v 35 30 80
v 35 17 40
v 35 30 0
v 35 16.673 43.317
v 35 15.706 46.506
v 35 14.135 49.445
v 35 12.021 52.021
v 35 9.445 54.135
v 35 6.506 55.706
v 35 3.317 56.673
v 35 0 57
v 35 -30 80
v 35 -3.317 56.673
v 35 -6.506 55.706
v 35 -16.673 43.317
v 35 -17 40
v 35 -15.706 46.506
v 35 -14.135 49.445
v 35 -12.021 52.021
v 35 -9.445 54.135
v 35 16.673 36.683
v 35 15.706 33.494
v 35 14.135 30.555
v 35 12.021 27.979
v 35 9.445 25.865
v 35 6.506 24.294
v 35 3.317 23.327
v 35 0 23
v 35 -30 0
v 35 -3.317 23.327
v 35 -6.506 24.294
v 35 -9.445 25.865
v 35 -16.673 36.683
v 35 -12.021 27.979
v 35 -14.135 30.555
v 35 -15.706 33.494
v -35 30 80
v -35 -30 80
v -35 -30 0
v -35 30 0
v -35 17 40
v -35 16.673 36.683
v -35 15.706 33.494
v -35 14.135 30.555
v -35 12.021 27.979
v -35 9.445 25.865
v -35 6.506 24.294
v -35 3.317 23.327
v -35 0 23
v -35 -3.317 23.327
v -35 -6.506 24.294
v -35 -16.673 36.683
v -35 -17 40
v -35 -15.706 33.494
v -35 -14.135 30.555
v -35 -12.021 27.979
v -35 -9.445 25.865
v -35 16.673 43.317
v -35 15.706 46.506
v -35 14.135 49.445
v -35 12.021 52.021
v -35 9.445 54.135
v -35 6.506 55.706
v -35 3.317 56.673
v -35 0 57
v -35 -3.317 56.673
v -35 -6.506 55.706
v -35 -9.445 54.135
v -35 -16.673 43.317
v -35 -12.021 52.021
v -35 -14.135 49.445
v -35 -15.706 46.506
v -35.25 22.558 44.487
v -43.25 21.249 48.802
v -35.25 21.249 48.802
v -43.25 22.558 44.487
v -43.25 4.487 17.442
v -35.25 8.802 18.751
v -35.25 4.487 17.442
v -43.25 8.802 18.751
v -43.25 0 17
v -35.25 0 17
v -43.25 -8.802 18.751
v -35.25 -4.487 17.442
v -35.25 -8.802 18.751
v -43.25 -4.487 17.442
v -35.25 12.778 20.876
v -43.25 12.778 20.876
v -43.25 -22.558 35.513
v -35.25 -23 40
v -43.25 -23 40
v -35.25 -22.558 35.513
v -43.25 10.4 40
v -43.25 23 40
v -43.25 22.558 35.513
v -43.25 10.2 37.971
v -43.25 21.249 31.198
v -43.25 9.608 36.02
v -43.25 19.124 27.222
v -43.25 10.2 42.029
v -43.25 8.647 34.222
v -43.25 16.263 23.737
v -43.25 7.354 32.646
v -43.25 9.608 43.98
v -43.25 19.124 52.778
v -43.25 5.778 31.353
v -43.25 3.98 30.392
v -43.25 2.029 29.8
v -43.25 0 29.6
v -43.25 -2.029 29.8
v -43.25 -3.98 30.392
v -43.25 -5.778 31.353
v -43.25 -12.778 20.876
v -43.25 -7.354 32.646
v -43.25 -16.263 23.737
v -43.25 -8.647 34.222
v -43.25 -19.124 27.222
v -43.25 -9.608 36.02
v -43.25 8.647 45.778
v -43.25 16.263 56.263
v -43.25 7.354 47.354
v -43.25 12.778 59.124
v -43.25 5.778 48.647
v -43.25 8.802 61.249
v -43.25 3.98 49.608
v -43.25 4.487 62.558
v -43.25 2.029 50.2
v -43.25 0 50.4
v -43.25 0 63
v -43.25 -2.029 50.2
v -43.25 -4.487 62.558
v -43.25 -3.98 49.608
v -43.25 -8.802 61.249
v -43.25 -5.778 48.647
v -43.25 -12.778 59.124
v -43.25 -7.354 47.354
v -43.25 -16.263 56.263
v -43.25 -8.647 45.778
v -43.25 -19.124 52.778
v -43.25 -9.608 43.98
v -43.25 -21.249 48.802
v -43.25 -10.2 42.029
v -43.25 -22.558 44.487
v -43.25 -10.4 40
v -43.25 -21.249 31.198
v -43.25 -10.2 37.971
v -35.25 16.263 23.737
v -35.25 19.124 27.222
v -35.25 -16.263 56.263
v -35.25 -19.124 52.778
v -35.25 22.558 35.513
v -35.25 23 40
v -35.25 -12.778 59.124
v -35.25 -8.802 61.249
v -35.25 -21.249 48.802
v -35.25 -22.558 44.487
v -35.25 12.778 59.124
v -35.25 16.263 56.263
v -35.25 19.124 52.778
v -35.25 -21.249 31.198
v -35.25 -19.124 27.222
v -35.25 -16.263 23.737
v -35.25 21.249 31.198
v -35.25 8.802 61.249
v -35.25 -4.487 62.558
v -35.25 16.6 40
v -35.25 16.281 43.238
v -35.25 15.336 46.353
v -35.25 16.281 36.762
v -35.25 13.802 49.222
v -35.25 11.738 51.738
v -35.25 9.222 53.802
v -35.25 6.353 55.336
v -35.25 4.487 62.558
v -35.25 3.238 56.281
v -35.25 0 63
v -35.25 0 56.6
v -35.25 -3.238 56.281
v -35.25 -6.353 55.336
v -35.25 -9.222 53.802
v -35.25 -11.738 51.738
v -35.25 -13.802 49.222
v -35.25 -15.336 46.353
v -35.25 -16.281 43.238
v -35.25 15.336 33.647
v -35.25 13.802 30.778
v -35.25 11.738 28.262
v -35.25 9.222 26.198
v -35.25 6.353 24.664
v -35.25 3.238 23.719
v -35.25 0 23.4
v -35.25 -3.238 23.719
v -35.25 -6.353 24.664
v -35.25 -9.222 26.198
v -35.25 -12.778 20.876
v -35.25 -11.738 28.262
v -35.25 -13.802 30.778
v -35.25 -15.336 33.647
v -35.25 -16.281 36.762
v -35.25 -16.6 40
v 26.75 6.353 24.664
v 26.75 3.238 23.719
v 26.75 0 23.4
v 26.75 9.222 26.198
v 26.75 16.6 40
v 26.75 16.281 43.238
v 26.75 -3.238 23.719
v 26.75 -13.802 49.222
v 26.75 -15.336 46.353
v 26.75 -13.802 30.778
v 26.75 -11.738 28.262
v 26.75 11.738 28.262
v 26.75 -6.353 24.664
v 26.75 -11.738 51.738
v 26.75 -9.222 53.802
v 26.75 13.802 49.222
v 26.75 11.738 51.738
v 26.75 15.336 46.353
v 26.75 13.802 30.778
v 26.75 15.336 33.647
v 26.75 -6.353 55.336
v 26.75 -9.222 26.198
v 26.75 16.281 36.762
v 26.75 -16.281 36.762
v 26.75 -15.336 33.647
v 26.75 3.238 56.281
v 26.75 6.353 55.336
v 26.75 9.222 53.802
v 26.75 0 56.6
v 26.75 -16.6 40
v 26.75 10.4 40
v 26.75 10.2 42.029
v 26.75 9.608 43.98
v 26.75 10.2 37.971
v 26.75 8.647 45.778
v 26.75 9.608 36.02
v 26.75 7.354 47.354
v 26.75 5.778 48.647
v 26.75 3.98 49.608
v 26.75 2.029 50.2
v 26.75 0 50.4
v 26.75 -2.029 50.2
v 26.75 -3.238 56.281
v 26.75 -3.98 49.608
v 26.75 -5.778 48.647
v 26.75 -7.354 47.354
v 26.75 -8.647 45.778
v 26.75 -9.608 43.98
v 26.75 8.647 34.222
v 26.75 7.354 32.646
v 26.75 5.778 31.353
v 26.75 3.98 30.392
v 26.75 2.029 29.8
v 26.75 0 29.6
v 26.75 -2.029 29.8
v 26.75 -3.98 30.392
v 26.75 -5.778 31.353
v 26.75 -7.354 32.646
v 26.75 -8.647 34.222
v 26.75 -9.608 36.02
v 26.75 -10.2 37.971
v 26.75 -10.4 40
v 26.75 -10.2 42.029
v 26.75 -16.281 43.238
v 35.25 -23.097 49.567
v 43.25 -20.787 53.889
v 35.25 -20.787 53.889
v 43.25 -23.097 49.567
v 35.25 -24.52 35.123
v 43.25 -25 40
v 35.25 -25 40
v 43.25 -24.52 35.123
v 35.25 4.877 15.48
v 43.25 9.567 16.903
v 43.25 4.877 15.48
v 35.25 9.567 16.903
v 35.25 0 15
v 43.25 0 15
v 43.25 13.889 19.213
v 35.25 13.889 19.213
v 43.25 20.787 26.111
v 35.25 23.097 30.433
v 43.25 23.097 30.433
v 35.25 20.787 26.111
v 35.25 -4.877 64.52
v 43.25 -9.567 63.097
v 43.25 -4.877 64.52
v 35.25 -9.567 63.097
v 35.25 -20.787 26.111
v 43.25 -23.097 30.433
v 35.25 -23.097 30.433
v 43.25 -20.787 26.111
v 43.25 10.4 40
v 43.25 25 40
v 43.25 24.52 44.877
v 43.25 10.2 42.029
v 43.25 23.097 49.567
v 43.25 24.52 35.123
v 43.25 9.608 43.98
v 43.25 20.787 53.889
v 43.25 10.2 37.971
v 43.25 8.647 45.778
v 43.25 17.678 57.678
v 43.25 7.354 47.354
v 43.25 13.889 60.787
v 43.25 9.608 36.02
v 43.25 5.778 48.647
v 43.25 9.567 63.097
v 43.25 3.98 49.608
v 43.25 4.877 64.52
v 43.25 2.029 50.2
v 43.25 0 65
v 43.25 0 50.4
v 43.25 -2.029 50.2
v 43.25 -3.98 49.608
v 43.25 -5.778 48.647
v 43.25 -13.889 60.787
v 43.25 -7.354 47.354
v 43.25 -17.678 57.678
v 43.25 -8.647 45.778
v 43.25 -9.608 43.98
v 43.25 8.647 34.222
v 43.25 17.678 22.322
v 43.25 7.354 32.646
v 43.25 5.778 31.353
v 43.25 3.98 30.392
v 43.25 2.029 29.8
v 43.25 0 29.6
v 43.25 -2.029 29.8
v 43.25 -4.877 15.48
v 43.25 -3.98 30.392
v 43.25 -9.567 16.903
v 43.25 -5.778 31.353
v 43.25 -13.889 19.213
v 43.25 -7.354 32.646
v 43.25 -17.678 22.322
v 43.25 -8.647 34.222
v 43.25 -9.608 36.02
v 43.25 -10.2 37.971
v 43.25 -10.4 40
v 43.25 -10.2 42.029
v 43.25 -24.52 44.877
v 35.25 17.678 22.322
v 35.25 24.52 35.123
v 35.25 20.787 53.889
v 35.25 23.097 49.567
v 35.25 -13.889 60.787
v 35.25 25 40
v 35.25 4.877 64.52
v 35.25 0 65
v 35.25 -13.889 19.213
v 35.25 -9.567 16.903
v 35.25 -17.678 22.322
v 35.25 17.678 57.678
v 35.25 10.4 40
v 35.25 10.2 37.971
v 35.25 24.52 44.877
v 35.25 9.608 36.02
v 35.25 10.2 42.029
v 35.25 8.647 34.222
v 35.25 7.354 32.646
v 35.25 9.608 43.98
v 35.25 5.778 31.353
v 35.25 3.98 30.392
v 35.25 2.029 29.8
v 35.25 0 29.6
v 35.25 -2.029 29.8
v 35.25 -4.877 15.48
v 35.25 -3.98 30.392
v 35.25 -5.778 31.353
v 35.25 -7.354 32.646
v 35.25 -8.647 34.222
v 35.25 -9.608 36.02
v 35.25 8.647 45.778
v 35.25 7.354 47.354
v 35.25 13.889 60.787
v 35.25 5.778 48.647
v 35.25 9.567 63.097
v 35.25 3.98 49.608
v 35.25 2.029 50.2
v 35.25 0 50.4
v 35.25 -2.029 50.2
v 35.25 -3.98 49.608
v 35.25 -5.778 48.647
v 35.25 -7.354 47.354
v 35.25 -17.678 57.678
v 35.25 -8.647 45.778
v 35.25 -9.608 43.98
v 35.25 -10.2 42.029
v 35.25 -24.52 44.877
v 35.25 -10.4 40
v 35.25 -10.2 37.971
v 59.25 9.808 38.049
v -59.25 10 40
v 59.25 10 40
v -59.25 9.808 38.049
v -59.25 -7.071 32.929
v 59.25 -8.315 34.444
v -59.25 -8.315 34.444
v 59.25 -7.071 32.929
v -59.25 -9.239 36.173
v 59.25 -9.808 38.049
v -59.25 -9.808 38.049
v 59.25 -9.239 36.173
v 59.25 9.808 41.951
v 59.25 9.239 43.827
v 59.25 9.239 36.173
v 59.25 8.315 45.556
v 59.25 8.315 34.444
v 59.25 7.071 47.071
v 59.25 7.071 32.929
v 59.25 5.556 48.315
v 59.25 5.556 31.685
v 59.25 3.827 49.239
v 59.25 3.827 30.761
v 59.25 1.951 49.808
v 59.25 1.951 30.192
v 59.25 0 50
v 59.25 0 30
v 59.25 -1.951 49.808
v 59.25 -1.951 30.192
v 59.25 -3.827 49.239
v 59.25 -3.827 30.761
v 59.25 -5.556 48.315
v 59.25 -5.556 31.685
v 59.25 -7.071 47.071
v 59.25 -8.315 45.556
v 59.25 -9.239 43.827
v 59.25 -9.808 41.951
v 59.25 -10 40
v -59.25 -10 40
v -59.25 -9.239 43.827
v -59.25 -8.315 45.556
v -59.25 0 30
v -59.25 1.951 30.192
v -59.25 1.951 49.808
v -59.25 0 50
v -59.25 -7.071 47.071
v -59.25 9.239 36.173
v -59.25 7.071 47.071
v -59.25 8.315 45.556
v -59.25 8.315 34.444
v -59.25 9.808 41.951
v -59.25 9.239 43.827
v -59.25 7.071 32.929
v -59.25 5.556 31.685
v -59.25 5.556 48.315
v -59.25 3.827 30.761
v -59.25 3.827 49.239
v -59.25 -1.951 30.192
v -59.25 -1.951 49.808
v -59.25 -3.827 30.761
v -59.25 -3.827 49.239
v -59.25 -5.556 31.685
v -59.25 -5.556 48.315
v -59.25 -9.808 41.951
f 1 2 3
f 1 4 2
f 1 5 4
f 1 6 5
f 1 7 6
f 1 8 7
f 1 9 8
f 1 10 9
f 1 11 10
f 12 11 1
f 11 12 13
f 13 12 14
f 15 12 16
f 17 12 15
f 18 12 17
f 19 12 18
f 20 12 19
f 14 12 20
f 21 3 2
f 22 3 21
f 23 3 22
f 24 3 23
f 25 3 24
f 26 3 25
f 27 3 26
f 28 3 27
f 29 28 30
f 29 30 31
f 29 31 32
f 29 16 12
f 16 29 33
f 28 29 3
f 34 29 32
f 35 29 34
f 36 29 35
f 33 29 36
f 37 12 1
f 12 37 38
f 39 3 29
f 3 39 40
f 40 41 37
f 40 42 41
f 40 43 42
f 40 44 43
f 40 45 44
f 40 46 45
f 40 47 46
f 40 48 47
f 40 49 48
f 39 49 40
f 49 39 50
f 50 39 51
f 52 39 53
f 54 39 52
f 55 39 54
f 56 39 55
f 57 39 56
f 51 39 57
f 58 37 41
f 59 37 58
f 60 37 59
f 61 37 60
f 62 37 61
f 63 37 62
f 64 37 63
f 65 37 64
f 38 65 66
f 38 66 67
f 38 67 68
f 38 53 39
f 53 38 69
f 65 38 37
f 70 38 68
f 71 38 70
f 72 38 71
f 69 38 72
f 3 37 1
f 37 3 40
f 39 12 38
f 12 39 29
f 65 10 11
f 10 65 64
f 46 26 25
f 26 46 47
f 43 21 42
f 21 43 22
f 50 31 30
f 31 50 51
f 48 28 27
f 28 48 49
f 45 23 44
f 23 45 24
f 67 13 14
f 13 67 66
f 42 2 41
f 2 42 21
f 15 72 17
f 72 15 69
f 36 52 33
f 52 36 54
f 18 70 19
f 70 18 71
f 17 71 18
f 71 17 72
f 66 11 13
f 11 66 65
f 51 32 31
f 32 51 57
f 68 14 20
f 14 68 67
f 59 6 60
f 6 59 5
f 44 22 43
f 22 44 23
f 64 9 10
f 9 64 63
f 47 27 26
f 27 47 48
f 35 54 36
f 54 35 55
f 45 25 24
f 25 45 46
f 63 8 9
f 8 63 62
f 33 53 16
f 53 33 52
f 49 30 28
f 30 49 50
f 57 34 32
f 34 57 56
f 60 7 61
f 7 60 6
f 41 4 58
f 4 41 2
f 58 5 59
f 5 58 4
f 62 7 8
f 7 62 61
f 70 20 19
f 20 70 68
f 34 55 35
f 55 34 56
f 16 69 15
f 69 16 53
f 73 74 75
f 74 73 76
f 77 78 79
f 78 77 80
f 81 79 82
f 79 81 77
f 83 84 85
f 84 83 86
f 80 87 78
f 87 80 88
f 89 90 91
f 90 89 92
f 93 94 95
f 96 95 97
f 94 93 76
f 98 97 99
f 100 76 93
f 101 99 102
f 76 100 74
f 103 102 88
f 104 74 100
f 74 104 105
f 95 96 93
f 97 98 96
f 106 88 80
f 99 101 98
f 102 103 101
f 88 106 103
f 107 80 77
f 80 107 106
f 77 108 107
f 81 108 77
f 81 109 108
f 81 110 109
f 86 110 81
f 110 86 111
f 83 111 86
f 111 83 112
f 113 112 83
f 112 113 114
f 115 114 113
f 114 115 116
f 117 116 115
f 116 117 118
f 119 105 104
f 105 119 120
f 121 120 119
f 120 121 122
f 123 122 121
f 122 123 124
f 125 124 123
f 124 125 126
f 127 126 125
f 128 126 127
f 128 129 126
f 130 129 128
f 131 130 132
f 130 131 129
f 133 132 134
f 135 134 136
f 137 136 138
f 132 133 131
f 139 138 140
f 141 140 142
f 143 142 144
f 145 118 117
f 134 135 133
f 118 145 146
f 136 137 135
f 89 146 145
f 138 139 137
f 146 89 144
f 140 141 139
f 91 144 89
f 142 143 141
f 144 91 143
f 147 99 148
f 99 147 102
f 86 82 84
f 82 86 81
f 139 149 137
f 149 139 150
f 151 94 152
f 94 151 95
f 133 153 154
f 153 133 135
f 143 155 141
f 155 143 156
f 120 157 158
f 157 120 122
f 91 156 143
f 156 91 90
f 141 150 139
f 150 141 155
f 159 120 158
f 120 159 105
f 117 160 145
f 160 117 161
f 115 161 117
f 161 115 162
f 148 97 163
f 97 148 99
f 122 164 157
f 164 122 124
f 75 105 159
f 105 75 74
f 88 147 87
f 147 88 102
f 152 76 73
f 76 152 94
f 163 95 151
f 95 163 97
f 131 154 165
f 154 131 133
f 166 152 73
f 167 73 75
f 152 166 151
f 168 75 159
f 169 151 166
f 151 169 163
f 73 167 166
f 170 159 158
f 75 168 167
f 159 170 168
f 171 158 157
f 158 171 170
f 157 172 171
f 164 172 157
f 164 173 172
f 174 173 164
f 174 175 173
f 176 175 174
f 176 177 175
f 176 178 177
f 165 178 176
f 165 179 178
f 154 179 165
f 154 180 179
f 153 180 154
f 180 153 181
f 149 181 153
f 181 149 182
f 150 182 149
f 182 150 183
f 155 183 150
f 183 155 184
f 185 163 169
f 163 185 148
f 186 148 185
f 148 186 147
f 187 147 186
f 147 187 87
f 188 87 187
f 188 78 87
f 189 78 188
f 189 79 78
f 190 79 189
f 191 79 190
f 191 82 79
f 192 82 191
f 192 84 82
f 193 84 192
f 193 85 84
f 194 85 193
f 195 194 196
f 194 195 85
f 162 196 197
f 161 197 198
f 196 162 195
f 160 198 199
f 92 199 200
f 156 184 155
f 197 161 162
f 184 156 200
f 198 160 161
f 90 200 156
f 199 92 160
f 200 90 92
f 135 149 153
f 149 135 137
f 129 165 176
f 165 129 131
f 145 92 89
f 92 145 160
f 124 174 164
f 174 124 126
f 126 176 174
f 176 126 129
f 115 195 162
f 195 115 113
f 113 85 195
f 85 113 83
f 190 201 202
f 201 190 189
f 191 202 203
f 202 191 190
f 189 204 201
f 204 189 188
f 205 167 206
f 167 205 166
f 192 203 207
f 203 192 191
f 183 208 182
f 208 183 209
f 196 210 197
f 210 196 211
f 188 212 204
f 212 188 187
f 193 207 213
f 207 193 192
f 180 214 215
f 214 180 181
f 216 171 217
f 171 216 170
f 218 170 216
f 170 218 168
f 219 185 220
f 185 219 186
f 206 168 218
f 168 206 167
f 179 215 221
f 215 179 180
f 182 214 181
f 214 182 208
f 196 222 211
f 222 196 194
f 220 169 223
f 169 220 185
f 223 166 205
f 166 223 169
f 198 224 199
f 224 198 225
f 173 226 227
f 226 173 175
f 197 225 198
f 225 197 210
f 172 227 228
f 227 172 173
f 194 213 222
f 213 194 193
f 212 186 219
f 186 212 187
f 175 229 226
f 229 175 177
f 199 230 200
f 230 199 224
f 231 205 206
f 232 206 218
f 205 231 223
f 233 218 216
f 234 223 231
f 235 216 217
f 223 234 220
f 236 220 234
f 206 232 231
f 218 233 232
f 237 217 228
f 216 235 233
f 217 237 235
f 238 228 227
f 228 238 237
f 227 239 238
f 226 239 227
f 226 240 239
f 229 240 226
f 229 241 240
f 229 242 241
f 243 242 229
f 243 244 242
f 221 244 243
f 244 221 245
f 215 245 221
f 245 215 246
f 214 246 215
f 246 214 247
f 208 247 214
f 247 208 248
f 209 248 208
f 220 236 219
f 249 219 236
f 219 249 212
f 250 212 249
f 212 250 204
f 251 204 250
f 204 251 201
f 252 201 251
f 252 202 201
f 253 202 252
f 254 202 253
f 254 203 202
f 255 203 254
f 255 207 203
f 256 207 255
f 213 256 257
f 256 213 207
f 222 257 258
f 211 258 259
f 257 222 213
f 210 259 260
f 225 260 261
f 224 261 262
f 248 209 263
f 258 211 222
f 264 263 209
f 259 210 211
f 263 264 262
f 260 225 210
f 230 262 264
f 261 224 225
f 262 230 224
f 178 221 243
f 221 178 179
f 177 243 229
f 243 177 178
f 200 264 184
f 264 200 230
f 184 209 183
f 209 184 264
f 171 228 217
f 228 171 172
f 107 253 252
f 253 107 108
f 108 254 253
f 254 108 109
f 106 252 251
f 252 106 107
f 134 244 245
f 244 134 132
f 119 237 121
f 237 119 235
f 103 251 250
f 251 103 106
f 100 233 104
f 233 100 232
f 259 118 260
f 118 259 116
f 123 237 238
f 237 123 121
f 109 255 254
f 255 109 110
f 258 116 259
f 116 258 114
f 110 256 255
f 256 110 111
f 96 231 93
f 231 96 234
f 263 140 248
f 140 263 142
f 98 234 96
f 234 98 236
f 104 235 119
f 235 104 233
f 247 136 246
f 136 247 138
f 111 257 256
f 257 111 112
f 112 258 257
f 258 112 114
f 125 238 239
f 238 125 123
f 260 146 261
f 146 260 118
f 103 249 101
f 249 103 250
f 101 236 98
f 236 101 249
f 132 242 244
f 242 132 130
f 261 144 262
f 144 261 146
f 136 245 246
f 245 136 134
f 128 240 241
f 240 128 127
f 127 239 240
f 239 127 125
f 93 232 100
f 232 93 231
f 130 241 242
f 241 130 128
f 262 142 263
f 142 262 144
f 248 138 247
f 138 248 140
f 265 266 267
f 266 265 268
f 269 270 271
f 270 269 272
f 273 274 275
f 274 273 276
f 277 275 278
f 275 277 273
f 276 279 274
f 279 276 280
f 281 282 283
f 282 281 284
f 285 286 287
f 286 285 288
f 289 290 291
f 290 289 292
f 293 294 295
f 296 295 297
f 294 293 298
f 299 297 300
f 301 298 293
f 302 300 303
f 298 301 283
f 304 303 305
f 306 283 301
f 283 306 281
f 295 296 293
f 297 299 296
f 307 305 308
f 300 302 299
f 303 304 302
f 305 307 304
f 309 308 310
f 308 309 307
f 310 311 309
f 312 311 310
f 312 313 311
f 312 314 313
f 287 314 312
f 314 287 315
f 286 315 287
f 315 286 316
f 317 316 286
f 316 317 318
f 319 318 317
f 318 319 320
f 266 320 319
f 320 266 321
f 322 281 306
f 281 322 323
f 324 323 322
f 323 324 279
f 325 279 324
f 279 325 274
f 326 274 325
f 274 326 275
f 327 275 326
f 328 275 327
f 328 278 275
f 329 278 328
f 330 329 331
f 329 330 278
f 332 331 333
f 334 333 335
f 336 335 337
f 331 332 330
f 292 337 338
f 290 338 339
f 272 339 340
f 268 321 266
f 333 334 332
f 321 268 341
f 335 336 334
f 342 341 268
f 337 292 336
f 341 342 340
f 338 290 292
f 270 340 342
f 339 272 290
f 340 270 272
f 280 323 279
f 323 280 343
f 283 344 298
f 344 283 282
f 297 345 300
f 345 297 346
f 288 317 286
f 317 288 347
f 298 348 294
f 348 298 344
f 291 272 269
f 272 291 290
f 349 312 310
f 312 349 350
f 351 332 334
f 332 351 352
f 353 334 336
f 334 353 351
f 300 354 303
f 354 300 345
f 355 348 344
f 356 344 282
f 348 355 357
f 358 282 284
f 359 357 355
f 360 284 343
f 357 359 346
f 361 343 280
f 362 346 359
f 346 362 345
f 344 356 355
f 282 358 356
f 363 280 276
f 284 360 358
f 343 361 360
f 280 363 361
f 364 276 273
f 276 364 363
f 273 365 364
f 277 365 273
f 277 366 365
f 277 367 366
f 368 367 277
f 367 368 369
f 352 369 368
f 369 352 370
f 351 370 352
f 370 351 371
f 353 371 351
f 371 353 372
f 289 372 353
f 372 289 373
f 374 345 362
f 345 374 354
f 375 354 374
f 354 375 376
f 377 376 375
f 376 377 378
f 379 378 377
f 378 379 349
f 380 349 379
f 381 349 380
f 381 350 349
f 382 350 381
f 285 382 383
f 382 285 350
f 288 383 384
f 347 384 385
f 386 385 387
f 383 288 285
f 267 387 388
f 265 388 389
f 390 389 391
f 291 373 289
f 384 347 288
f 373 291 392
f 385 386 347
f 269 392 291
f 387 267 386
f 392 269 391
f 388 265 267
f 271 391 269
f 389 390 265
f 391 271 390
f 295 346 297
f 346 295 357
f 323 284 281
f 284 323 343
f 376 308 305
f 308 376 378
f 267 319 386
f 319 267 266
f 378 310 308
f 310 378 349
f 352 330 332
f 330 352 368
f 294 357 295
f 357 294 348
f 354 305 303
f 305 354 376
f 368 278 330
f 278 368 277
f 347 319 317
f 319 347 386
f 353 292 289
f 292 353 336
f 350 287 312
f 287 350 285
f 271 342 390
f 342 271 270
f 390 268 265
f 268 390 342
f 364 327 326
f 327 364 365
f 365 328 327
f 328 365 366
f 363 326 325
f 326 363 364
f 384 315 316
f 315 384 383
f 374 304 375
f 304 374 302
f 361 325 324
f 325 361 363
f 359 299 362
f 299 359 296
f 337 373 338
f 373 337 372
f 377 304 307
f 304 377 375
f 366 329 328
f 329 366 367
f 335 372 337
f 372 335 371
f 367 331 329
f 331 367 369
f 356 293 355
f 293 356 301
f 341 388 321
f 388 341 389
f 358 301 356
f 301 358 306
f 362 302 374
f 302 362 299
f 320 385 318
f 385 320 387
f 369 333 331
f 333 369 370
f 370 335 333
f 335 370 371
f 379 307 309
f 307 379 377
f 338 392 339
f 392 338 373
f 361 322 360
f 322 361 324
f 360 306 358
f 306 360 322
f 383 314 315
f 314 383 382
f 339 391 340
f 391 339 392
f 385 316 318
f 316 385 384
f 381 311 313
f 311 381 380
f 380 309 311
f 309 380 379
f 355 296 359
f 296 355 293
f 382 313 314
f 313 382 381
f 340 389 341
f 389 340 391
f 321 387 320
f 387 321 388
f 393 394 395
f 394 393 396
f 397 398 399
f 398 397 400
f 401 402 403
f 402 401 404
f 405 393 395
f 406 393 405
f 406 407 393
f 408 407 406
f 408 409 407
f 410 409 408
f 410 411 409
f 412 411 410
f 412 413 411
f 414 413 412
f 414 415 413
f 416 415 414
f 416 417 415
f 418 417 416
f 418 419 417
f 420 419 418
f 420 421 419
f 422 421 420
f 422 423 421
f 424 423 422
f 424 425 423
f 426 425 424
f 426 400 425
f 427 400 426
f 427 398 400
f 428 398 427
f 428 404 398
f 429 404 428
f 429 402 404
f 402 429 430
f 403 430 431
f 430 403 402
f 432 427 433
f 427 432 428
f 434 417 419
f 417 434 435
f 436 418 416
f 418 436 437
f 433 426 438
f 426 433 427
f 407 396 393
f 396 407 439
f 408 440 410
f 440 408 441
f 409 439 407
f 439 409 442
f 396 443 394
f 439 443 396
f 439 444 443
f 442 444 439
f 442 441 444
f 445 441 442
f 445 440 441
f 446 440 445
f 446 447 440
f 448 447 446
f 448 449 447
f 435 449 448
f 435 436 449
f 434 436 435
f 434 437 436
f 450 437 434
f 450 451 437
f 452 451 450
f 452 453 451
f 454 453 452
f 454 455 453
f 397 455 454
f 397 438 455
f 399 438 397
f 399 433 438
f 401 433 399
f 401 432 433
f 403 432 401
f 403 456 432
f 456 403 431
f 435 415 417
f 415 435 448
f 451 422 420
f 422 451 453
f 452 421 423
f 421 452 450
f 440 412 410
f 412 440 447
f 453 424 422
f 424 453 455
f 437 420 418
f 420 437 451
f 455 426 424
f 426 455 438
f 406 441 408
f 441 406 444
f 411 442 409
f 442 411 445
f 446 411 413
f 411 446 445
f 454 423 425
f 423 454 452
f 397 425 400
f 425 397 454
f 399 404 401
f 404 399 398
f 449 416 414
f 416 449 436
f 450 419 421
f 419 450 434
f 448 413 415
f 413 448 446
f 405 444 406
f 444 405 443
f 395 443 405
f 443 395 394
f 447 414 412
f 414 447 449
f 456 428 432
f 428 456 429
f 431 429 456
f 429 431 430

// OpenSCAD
$fn = 32;

// ------------------------------------------------------------------------
// Bushed housing: 70 x 60 x 80 mm housing, bushing d33.2
// Every part is its own module, assembly() places them once.
// ------------------------------------------------------------------------

// --- part 1 ---
module housing() {
  difference() {
    translate([-35, -30, 0]) cube([70, 60, 80]);
    translate([0, 0, 40]) rotate([0, 90, 0]) cylinder(h = 72, d = 34, center = true);
  }
}

// --- part 2 ---
module bushing() {
  difference() {
    union() {
      cylinder(h = 8, d = 46);
      translate([0, 0, 8]) cylinder(h = 62, d = 33.2);
    }
    translate([0, 0, -1]) cylinder(h = 72, d = 20.8);
  }
}

// --- part 3 ---
module shaft() {
  translate([0, 0, -59.25]) cylinder(h = 118.5, d = 20);
}

// --- part 4 ---
module cover() {
  difference() {
    cylinder(h = 8, d = 50);
    translate([0, 0, -1]) cylinder(h = 10, d = 20.8);
  }
}

// --- assembly ---
module assembly() {
  translate([0, 0, 0]) rotate([0, 0, 0]) housing();
  translate([-43.25, 0, 40]) rotate([0, 90, 0]) bushing();
  translate([0, 0, 40]) rotate([0, 90, 0]) shaft();
  translate([35.25, 0, 40]) rotate([0, 90, 0]) cover();
}

assembly();
